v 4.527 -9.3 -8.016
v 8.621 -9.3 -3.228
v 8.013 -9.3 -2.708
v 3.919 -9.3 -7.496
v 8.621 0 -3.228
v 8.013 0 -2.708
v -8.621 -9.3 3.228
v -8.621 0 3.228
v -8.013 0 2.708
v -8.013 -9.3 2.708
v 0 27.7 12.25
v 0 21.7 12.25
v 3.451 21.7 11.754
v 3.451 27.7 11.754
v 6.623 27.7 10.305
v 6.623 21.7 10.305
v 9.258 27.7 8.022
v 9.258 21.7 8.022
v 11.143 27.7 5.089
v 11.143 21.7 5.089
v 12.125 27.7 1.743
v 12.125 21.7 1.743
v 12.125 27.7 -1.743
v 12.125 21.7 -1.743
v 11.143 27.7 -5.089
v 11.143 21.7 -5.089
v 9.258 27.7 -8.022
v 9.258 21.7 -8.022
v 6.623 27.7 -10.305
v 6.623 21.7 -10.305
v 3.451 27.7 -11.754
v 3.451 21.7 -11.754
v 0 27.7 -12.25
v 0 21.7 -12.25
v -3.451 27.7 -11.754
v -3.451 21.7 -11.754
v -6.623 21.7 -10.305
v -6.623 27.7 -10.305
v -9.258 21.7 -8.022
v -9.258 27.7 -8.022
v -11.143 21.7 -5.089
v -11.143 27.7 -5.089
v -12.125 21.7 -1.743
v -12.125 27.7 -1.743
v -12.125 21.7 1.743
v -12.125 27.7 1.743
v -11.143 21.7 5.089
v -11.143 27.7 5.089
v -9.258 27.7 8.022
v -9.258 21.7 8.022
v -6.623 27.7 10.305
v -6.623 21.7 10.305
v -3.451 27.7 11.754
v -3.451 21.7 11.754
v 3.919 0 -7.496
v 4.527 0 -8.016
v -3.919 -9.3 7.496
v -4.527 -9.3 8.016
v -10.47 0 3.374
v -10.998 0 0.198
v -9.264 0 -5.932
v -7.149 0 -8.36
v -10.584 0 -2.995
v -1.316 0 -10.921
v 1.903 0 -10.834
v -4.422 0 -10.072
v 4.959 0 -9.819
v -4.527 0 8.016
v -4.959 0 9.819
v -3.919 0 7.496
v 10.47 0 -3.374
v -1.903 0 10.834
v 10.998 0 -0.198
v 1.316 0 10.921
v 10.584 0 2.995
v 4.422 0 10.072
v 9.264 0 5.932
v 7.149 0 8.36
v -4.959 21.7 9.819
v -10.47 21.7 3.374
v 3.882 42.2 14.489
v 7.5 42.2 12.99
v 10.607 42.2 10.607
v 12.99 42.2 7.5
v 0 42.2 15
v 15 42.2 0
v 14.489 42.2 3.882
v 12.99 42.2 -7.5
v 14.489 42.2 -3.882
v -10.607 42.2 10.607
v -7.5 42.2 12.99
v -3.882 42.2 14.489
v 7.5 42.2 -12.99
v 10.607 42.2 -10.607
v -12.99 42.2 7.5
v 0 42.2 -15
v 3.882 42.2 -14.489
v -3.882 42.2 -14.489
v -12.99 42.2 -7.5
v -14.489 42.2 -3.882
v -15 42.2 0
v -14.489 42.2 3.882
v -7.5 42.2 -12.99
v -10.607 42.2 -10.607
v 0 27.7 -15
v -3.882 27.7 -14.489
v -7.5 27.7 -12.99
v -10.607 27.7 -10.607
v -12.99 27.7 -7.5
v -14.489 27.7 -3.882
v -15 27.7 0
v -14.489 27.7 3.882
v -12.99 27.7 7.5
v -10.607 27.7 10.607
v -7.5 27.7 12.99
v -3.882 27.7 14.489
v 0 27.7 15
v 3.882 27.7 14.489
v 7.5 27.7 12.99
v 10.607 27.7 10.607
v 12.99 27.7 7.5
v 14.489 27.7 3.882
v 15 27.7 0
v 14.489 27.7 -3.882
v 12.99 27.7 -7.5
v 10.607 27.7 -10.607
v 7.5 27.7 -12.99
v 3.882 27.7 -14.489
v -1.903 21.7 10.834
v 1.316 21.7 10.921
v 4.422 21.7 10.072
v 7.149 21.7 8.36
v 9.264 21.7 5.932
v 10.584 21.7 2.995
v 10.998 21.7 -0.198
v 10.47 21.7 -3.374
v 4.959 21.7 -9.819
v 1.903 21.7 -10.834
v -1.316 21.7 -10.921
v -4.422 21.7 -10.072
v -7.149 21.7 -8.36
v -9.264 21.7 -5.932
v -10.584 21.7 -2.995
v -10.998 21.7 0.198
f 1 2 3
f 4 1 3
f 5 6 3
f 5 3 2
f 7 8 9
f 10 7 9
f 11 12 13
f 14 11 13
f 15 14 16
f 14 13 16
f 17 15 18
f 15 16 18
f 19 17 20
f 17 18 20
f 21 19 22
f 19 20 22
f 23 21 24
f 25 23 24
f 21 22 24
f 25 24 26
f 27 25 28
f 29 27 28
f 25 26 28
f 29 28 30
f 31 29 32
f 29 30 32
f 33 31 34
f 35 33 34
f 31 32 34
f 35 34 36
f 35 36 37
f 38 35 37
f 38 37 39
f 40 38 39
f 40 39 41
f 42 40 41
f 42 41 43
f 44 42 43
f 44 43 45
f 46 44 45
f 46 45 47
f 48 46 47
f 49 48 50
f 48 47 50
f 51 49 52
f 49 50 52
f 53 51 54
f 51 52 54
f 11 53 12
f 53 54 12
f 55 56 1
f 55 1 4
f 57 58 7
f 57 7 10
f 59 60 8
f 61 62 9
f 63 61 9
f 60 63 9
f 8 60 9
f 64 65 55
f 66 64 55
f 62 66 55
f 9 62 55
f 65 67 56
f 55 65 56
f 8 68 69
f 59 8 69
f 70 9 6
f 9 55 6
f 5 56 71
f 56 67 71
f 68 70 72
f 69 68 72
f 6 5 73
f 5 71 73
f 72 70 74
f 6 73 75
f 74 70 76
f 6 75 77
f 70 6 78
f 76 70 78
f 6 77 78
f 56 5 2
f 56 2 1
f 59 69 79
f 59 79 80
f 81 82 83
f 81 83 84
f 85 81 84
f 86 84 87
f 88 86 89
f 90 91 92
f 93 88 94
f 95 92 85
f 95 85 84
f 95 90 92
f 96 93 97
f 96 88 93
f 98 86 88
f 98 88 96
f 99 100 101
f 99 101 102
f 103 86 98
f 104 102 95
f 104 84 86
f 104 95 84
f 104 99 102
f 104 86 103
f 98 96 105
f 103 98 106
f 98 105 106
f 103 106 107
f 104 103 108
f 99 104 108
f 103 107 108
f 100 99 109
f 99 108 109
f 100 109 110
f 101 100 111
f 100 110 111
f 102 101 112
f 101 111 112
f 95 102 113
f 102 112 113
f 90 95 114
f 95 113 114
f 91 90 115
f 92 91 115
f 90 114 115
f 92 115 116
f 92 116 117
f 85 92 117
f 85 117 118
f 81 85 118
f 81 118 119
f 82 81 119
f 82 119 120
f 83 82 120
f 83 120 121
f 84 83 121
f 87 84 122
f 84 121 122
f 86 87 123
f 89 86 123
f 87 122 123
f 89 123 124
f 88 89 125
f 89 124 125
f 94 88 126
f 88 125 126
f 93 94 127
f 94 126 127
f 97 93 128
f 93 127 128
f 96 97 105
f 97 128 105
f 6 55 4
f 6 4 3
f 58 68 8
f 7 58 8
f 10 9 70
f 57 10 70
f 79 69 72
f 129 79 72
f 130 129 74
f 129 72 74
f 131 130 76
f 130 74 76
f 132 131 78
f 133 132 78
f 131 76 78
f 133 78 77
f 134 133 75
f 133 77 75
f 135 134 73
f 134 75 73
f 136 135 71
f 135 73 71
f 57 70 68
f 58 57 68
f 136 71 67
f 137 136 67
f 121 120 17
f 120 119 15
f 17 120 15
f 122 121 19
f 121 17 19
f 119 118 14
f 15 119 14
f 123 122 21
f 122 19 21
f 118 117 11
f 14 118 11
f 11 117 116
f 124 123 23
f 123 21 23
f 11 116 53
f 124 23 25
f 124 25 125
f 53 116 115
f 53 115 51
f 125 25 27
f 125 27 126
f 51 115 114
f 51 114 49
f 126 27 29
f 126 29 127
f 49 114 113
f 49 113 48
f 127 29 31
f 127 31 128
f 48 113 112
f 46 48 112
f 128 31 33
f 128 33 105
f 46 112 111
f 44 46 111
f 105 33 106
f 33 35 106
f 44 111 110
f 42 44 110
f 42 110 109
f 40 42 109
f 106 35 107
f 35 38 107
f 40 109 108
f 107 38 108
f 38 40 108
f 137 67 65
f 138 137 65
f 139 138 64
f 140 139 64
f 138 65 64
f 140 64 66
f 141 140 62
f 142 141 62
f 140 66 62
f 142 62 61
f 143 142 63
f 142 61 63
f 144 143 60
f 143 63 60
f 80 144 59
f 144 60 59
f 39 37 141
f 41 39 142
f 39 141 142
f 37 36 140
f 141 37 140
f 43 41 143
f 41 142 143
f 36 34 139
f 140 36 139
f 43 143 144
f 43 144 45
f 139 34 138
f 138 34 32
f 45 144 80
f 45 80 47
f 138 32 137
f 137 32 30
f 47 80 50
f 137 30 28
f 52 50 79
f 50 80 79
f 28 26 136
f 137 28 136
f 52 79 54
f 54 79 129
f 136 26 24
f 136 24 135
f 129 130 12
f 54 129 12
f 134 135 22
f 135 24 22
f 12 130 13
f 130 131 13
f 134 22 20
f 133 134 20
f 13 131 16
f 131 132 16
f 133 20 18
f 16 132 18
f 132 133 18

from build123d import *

# Parameters (mm, degrees)
SKETCH1_R           = 11
BOSS_EXTRUDE1_DEPTH = 21.7
SKETCH7_R           = 12.25
BOSS_EXTRUDE6_DEPTH = 6
SKETCH8_R           = 15
BOSS_EXTRUDE7_DEPTH = 14.5
CUT_EXTRUDE4_DEPTH  = 21.7
BOSS_EXTRUDE8_DEPTH = 9.3


with BuildPart() as part:
    # Sketch1 → Boss-Extrude1 (new body)
    with BuildSketch(Plane(origin=(0, 0, 0), x_dir=(1, 0, 0), z_dir=(0, 1, 0))):
        with Locations(Location((0, 0, 0), (0, 0, 270))):
            Circle(SKETCH1_R)
    extrude(amount=BOSS_EXTRUDE1_DEPTH)

    # Sketch7 → Boss-Extrude6 (add)
    with BuildSketch(Plane(origin=(0, 21.7, 0), x_dir=(1, 0, 0), z_dir=(0, 1, 0))):
        with Locations(Location((0, 0, 0), (0, 0, 270))):
            Circle(SKETCH7_R)
    extrude(amount=BOSS_EXTRUDE6_DEPTH)

    # Sketch8 → Boss-Extrude7 (add)
    with BuildSketch(Plane(origin=(0, 27.7, 0), x_dir=(1, 0, 0), z_dir=(0, 1, 0))):
        with Locations(Location((0, 0, 0), (0, 0, 90))):
            Circle(SKETCH8_R)
    extrude(amount=BOSS_EXTRUDE7_DEPTH)

    # Sketch3 → Cut-Extrude4 (cut)
    with BuildSketch(Plane.XZ):
        with BuildLine():
            Line((-4.958555581, 9.818998246), (-10.469742362, 3.374091709))
            ThreePointArc((-10.469742362, 3.374091709), (-8.360161447, 7.148965), (-4.958555581, 9.818998246))
        make_face()
        with BuildLine():
            Line((10.469742362, -3.374091709), (4.958555581, -9.818998246))
            ThreePointArc((4.958555581, -9.818998246), (8.360161447, -7.148965), (10.469742362, -3.374091709))
        make_face()
    extrude(amount=-CUT_EXTRUDE4_DEPTH, mode=Mode.SUBTRACT)

    # Sketch9 → Boss-Extrude8 (add)
    with BuildSketch(Plane.XZ):
        Polygon((8.013326492, -2.707706192), (8.621338234, -3.227630919), (4.526931006, -8.015723384), (3.918919265, -7.495798657), align=None)
        Polygon((-3.918903937, 7.495816582), (-4.526915678, 8.015741309), (-8.621322906, 3.227648844), (-8.013311164, 2.707724116), align=None)
    extrude(amount=BOSS_EXTRUDE8_DEPTH)


solid = part.part
